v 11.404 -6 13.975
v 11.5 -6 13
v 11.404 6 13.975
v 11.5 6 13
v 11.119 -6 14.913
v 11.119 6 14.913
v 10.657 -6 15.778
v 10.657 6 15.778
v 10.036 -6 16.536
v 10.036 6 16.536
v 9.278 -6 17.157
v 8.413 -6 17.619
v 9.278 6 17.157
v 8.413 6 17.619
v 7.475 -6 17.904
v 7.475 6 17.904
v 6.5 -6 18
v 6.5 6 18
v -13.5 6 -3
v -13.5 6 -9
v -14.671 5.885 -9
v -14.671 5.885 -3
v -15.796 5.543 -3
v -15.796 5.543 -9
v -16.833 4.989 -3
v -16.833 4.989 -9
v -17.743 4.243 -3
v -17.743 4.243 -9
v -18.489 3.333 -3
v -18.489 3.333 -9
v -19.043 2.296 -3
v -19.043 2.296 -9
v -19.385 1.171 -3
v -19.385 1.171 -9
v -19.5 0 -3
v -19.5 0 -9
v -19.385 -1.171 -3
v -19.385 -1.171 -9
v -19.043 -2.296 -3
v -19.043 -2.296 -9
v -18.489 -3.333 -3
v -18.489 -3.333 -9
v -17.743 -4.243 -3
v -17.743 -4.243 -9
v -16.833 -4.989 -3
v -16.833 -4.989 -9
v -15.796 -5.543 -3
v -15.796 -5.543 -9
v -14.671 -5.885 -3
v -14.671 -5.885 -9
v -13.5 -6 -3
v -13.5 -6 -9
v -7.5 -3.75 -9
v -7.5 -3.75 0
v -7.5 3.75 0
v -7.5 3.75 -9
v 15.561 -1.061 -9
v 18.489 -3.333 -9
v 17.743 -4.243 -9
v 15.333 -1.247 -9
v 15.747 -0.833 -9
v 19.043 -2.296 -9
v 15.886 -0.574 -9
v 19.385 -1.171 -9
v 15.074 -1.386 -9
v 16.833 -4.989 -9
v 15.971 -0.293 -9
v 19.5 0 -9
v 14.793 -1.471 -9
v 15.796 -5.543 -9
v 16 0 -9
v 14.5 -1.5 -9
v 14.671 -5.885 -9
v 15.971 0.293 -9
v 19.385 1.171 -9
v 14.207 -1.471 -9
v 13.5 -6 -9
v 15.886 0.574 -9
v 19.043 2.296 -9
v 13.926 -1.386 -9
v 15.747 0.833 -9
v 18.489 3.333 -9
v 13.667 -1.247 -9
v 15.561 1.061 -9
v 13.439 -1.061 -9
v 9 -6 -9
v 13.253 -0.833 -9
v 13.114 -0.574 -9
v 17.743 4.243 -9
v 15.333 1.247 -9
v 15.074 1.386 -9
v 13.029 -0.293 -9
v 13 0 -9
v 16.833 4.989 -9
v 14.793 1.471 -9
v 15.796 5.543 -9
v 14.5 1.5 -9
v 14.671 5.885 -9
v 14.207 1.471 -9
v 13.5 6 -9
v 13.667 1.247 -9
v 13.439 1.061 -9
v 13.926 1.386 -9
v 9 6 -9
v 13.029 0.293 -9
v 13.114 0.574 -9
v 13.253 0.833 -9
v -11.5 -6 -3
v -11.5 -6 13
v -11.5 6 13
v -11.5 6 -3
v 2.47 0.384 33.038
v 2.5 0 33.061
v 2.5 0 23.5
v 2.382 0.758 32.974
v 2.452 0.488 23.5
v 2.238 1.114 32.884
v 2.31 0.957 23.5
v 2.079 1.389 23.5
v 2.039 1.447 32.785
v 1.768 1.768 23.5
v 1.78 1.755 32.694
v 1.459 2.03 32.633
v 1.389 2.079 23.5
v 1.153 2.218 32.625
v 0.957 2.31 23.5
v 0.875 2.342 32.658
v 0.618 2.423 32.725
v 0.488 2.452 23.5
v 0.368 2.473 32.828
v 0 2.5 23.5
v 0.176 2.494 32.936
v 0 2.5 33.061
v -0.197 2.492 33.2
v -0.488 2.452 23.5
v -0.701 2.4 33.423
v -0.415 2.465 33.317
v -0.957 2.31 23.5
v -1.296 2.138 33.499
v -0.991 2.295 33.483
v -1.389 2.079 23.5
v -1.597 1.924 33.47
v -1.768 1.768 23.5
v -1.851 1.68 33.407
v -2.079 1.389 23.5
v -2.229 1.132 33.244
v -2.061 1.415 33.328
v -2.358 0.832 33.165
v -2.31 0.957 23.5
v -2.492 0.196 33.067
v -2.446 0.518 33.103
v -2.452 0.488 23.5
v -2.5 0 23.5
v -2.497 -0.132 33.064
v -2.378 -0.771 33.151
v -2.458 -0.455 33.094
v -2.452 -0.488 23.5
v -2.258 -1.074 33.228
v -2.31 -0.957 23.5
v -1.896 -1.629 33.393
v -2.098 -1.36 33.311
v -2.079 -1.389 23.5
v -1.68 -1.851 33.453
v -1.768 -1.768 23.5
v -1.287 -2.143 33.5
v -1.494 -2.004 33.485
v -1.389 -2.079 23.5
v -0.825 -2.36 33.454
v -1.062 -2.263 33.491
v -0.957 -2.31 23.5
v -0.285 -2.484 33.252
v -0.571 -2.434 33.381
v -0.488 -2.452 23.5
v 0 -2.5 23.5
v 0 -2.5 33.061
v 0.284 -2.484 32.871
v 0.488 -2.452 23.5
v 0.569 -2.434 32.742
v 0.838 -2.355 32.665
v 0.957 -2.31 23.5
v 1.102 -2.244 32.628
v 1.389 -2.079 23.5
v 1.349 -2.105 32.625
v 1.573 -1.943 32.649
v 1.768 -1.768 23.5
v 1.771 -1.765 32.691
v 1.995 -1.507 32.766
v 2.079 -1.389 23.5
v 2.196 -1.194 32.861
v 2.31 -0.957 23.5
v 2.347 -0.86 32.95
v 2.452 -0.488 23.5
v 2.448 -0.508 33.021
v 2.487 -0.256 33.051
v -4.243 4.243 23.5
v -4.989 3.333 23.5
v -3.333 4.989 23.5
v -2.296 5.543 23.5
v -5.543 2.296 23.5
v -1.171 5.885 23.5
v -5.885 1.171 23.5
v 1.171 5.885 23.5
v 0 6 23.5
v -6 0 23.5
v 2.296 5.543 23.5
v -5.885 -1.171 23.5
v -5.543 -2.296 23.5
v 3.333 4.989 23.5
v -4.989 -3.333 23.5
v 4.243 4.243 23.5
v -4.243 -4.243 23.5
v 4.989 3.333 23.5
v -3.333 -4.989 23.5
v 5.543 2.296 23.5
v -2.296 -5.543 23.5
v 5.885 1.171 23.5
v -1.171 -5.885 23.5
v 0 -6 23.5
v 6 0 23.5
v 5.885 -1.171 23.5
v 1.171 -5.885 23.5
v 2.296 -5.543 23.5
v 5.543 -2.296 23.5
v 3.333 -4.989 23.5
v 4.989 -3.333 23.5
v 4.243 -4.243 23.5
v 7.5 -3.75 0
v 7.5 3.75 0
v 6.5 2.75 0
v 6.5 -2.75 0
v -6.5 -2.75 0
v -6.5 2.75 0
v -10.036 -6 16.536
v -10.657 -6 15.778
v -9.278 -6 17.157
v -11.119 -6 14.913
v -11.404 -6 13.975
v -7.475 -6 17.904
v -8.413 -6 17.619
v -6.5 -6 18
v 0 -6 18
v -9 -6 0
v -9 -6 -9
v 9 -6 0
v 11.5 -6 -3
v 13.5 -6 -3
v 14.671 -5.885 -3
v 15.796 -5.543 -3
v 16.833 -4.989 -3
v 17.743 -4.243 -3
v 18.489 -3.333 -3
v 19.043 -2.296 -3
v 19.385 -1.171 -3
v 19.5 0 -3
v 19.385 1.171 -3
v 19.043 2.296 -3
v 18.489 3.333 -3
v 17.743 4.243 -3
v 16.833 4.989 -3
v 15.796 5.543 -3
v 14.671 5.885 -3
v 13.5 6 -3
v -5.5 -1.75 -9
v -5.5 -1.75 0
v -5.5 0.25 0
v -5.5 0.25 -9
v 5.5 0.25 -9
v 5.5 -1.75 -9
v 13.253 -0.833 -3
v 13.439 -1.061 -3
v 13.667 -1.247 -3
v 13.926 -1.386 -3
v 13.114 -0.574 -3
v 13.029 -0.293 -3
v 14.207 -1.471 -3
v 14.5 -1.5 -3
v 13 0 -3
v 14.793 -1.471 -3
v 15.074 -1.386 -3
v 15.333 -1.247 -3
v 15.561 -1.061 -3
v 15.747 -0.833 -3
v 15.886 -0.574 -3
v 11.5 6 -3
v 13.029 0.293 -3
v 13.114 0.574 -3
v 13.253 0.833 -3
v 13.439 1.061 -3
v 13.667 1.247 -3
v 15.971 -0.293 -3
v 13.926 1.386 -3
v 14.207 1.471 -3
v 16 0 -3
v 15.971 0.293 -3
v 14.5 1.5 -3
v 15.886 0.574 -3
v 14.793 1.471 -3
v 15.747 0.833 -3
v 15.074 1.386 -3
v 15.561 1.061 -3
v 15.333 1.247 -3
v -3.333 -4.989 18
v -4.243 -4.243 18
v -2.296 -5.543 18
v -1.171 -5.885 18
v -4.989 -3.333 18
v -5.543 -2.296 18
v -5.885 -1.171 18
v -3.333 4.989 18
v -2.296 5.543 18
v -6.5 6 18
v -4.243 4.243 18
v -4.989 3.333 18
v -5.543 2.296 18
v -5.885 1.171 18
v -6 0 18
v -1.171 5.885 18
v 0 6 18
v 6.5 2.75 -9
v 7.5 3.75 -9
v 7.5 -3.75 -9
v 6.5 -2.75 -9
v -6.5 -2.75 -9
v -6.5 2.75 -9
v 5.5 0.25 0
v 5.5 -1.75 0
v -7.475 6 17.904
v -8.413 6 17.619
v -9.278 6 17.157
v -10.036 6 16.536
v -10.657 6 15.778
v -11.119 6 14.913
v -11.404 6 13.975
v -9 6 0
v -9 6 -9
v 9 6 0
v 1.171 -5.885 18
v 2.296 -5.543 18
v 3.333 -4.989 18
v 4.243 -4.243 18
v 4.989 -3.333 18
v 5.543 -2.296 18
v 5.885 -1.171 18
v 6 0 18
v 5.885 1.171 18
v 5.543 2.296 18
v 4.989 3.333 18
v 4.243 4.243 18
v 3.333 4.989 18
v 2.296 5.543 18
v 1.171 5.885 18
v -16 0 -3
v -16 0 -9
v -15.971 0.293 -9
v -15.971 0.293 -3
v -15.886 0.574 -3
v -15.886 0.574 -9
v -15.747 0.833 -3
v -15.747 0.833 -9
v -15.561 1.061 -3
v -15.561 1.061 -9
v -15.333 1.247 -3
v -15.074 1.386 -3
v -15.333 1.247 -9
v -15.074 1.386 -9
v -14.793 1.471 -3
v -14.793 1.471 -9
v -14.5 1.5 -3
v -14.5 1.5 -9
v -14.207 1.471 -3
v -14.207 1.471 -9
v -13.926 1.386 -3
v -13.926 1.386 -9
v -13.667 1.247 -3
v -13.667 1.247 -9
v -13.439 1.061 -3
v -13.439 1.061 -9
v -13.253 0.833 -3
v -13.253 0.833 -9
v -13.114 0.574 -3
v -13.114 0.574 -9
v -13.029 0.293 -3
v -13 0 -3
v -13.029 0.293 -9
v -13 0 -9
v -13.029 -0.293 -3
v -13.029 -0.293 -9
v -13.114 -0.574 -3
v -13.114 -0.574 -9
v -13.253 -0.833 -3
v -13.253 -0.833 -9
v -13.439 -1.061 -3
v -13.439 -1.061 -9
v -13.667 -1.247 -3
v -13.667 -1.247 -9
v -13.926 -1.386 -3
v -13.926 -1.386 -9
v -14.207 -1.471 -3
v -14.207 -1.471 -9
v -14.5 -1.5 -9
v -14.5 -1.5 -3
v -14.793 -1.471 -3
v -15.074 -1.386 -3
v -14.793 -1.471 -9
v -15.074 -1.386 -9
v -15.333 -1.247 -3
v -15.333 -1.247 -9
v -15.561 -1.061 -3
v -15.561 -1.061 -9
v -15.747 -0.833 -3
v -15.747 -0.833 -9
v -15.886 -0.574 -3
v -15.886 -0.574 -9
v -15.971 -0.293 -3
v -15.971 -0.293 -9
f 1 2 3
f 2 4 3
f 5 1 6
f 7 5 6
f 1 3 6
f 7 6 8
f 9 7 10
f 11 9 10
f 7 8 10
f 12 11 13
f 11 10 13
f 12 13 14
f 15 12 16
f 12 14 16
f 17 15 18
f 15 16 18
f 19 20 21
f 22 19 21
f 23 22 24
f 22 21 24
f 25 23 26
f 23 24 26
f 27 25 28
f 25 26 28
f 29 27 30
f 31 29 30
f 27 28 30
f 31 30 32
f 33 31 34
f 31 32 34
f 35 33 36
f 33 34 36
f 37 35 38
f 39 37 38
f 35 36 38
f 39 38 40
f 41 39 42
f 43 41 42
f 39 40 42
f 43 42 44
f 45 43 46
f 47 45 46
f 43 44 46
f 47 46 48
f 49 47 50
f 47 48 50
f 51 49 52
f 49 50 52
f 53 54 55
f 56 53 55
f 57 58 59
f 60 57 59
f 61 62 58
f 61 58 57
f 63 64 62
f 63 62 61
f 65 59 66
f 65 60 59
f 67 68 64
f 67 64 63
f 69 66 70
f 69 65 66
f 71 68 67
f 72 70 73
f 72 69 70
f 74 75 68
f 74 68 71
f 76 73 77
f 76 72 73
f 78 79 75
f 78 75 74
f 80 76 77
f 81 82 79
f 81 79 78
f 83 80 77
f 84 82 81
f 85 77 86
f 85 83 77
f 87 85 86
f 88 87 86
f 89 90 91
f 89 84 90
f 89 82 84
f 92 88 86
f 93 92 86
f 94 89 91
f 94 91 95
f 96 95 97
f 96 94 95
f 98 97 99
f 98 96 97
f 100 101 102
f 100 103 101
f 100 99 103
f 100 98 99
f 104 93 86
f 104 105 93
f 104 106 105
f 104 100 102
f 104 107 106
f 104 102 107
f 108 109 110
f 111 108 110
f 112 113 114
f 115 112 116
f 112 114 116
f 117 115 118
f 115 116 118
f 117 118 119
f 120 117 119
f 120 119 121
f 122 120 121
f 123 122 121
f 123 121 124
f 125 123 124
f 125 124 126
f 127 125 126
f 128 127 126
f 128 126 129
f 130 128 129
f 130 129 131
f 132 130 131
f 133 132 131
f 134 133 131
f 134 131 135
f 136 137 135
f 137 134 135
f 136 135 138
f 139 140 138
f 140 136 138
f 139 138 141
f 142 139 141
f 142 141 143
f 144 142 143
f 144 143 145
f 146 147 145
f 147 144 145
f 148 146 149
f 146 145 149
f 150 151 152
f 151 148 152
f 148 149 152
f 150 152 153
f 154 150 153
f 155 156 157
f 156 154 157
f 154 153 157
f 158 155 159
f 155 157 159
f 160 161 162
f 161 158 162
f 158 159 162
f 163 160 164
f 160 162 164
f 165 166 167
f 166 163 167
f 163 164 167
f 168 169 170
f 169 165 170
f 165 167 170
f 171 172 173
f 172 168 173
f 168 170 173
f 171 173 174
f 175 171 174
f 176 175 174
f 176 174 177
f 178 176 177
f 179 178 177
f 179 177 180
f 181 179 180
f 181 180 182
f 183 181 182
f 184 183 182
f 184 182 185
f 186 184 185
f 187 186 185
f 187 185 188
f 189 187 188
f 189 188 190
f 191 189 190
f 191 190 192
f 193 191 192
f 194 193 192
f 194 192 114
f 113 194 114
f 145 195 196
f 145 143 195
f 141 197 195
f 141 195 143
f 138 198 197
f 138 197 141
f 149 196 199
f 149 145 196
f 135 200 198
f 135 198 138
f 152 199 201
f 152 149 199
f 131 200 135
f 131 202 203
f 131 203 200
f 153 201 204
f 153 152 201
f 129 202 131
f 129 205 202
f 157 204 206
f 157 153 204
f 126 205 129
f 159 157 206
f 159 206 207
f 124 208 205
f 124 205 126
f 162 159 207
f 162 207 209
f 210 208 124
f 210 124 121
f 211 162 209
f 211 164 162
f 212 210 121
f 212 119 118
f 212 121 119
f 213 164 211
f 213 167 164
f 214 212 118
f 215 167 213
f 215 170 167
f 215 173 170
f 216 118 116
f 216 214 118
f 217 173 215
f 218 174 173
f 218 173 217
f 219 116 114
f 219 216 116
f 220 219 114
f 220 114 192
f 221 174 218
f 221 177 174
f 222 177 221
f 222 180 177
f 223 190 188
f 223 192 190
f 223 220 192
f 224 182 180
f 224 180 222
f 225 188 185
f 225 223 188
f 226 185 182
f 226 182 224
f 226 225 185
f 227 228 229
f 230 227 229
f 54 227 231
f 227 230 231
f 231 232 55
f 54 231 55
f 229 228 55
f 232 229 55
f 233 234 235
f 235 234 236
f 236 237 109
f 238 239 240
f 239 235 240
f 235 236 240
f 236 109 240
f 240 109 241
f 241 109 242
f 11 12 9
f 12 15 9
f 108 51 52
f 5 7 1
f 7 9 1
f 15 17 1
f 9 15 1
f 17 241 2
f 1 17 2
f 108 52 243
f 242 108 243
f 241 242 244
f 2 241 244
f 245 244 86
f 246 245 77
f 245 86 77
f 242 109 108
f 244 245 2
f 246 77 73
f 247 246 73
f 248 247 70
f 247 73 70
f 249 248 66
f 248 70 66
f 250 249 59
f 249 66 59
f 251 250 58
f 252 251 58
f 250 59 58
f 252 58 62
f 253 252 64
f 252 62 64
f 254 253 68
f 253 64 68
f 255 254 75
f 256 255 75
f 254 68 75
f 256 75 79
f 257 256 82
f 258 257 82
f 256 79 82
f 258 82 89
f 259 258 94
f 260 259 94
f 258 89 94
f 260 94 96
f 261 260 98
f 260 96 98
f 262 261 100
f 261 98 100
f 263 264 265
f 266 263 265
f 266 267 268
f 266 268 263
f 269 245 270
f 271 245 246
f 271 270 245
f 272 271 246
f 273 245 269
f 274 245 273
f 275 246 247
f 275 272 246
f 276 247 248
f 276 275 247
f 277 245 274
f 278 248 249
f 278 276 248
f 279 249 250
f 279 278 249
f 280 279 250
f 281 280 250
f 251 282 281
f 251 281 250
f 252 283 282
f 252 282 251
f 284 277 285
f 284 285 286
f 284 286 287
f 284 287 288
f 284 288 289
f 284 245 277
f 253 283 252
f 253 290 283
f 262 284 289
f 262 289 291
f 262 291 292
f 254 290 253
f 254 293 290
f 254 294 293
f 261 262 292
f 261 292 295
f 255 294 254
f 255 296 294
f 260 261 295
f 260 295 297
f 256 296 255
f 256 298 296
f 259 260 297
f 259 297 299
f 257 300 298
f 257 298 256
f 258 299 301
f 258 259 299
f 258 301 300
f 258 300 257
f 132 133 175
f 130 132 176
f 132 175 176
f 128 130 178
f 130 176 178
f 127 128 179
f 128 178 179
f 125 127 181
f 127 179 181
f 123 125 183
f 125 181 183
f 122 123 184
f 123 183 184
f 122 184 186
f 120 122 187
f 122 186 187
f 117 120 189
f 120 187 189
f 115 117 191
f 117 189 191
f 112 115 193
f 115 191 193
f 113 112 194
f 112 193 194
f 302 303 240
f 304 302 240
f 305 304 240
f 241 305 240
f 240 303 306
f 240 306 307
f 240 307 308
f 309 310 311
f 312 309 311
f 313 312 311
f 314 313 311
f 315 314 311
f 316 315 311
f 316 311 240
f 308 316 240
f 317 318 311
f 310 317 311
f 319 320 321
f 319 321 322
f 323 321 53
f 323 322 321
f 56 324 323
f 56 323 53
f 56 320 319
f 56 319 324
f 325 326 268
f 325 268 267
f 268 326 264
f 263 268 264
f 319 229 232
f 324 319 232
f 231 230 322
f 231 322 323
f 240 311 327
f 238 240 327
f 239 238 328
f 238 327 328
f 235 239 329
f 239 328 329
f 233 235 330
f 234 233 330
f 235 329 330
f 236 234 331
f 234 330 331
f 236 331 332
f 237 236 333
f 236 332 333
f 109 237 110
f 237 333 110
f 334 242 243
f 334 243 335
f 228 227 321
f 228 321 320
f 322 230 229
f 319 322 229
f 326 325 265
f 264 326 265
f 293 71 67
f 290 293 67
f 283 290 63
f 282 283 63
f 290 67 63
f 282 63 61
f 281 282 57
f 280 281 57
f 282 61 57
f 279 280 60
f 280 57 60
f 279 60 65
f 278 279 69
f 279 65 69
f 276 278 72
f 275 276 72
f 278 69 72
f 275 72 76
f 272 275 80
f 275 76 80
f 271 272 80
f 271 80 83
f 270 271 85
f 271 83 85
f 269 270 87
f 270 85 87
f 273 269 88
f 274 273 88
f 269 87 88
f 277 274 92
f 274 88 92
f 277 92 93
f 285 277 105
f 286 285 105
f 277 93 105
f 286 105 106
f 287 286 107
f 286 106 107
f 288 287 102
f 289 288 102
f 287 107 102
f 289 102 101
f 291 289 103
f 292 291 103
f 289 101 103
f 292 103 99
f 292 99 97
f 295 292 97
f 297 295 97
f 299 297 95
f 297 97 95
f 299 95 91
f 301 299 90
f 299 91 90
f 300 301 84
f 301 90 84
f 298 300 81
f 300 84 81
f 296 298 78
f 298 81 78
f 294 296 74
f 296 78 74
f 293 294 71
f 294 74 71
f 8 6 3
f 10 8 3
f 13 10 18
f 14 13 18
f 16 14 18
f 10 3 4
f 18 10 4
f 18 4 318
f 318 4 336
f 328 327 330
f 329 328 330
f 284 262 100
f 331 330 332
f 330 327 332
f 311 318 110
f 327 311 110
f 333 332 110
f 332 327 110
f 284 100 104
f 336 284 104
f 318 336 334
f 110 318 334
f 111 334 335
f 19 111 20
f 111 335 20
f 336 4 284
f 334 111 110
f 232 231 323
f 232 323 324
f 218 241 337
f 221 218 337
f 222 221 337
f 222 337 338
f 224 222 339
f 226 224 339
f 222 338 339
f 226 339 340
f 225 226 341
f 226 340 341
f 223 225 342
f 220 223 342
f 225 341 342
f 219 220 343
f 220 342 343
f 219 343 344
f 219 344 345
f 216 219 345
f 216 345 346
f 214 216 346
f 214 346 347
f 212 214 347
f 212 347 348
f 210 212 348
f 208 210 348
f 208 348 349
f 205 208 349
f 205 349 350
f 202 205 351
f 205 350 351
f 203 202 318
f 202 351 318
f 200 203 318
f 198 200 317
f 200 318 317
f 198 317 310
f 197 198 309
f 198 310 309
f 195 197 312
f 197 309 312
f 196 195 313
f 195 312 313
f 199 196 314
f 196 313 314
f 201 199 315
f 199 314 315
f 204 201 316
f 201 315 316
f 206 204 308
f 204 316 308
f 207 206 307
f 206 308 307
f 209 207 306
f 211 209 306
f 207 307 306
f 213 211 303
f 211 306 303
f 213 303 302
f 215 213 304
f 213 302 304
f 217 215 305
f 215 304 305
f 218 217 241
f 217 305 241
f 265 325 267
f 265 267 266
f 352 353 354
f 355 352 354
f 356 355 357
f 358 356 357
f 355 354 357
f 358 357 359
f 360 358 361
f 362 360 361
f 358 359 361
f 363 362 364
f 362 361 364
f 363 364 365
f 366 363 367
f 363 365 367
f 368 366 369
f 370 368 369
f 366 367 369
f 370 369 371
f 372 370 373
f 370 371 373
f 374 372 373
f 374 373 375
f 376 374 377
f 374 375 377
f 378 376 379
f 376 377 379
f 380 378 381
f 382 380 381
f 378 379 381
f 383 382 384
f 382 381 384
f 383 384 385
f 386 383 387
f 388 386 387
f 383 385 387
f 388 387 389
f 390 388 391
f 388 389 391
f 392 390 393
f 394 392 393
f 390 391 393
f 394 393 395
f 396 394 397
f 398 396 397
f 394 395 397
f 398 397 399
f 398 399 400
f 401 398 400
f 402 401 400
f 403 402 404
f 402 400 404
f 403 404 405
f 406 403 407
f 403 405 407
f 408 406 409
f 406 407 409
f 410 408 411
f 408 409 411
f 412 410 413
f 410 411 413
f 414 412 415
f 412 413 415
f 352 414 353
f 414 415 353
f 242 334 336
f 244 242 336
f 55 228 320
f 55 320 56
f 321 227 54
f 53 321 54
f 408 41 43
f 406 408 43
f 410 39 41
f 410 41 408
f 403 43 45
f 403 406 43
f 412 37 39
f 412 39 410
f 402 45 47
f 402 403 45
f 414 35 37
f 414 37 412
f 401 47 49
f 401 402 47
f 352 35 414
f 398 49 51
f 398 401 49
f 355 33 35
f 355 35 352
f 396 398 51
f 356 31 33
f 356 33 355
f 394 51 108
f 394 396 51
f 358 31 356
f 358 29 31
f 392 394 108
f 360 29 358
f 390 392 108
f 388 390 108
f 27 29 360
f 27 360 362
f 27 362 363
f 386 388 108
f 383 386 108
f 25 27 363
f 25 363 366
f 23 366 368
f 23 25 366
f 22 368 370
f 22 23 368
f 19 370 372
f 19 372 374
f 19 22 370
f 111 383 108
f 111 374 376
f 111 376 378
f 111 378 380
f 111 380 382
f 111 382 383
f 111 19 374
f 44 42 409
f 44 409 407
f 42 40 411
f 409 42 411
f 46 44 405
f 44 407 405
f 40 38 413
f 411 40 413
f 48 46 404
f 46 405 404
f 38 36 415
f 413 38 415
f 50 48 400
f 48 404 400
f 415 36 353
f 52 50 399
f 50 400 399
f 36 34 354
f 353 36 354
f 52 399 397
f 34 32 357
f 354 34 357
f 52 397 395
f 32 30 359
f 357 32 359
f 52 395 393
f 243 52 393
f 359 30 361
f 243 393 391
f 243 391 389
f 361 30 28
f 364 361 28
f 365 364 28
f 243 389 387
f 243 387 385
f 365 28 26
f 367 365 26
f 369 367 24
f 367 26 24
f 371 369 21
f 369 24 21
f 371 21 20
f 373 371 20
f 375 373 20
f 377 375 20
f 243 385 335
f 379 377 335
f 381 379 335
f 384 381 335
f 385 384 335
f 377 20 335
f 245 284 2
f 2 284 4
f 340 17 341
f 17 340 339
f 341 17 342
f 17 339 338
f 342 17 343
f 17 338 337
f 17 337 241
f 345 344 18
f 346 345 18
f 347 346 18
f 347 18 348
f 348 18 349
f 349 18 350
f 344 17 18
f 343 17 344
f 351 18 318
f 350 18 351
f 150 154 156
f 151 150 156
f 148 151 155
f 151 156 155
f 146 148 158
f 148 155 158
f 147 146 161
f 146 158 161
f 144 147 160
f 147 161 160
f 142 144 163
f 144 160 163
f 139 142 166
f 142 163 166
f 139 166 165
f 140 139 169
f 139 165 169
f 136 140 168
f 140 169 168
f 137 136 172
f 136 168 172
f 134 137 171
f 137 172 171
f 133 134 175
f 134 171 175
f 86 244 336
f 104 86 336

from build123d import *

# Parameters (mm, degrees)
P_IDAT_VYSUNUT_M1_DEPTH       = 6
SKICA2_W                      = 2.5
SKICA2_H                      = 12
P_IDAT_VYSUNUT_M2_DEPTH       = 9
SKICA3_R                      = 1.5
P_IDAT_VYSUNUT_M3_DEPTH       = 6
SKICA5_R                      = 6
P_IDAT_VYSUNUT_M4_DEPTH       = 5.5
SKICA6_W                      = 15
SKICA6_H                      = 7.5
SKICA6_W_2                    = 13
SKICA6_H_2                    = 5.5
P_IDAT_VYSUNUT_M5_DEPTH       = 9
SKICA7_W                      = 11
SKICA7_H                      = 2
P_IDAT_VYSUNUT_M7_DEPTH       = 9
SKICA8_R                      = 2.5
P_IDAT_VYSUNUT_M8_DEPTH       = 10
ODEBRAT_VYSUNUT_M2_DEPTH      = 40.223717315
ODEBRAT_VYSUNUT_M2_DEPTH_BACK = 40.223717315


with BuildPart() as part:
    # Skica1 → Přidat vysunutím1 (new, symmetric)
    with BuildSketch(Plane(origin=(0, 0, 0), x_dir=(1, 0, 0), z_dir=(0, 1, 0))):
        with BuildLine():
            Line((-11.5, 0), (11.5, 0))
            Line((11.5, 0), (11.5, -13))
            ThreePointArc((11.5, -13), (10.035533906, -16.535533906), (6.5, -18))
            Line((6.5, -18), (-6.5, -18))
            ThreePointArc((-6.5, -18), (-10.035533906, -16.535533906), (-11.5, -13))
            Line((-11.5, -13), (-11.5, 0))
        make_face()
    extrude(amount=P_IDAT_VYSUNUT_M1_DEPTH, both=True)

    # Skica2 → Přidat vysunutím2 (add)
    with BuildSketch(Plane(origin=(0, 0, 0), x_dir=(-1, 0, 0), z_dir=(0, 0, -1))):
        with Locations((10.25, 0)):
            Rectangle(SKICA2_W, SKICA2_H)
        with Locations((-10.25, 0)):
            Rectangle(SKICA2_W, SKICA2_H)
    extrude(amount=P_IDAT_VYSUNUT_M2_DEPTH)

    # Skica3 → Přidat vysunutím3 (add)
    # profile 1 of 2: a face of its own
    with BuildSketch(Plane(origin=(0, 0, -9), x_dir=(-1, 0, 0), z_dir=(0, 0, -1))):
        with BuildLine():
            Line((11.5, 6), (13.5, 6))
            ThreePointArc((13.5, 6), (19.5, 0), (13.5, -6))
            Line((13.5, -6), (11.5, -6))
            Line((11.5, -6), (11.5, 6))
        make_face()
        with Locations((14.5, 0)):
            Circle(SKICA3_R, mode=Mode.SUBTRACT)
    # profile 2 of 2: a face of its own
    with BuildSketch(Plane(origin=(0, 0, -9), x_dir=(-1, 0, 0), z_dir=(0, 0, -1))):
        with BuildLine():
            Line((-11.5, 6), (-11.5, -6))
            Line((-11.5, -6), (-13.5, -6))
            ThreePointArc((-13.5, -6), (-19.5, 0), (-13.5, 6))
            Line((-13.5, 6), (-11.5, 6))
        make_face()
        with Locations(Location((-14.5, 0, 0), (0, 0, 180))):
            Circle(SKICA3_R, mode=Mode.SUBTRACT)
    extrude(amount=-P_IDAT_VYSUNUT_M3_DEPTH)

    # Skica5 → Přidat vysunutím4 (add)
    with BuildSketch(Plane.XY.offset(18)):
        with Locations(Location((0, 0, 0), (0, 0, 270))):
            Circle(SKICA5_R)
    extrude(amount=P_IDAT_VYSUNUT_M4_DEPTH)

    # Skica8 → Přidat vysunutím8 (add)
    with BuildSketch(Plane.XY.offset(23.5)):
        Circle(SKICA8_R)
    extrude(amount=P_IDAT_VYSUNUT_M8_DEPTH)

    # Skica9 → Odebrat vysunutím2 (cut, two sides: drawn at the far end of the back side and taken through both)
    with BuildSketch(Plane(origin=(0, 0, 0), x_dir=(1, 0, 0), z_dir=(0, 1, 0)).offset(-ODEBRAT_VYSUNUT_M2_DEPTH_BACK)):
        with BuildLine():
            Line((-84.414613958, 32.522930014), (-2.5, -33.0612495))
            ThreePointArc((-2.5, -33.0612495), (-1.25, -33.5), (0, -33.0612495))
            ThreePointArc((0, -33.0612495), (1.25, -32.622498999), (2.5, -33.0612495))
            Line((2.5, -33.0612495), (84.414613958, -98.645429013))
            Line((84.414613958, -98.645429013), (-44.345076014, -264.37441431))
            Line((-44.345076014, -264.37441431), (-213.17430393, -133.206055283))
            Line((-213.17430393, -133.206055283), (-84.414613958, 32.522930014))
        make_face()
    extrude(amount=ODEBRAT_VYSUNUT_M2_DEPTH + ODEBRAT_VYSUNUT_M2_DEPTH_BACK, mode=Mode.SUBTRACT)


with BuildPart() as body_2:
    # Skica6 → Přidat vysunutím5 (new body)
    with BuildSketch(Plane(origin=(0, 0, 0), x_dir=(-1, 0, 0), z_dir=(0, 0, -1))):
        Rectangle(SKICA6_W, SKICA6_H)
        Rectangle(SKICA6_W_2, SKICA6_H_2, mode=Mode.SUBTRACT)
    extrude(amount=P_IDAT_VYSUNUT_M5_DEPTH)


with BuildPart() as body_3:
    # Skica7 → Přidat vysunutím7 (new body)
    with BuildSketch(Plane(origin=(0, 0, 0), x_dir=(-1, 0, 0), z_dir=(0, 0, -1))):
        with Locations((0, -0.75)):
            Rectangle(SKICA7_W, SKICA7_H)
    extrude(amount=P_IDAT_VYSUNUT_M7_DEPTH)


solid = Compound([part.part, body_2.part, body_3.part])
